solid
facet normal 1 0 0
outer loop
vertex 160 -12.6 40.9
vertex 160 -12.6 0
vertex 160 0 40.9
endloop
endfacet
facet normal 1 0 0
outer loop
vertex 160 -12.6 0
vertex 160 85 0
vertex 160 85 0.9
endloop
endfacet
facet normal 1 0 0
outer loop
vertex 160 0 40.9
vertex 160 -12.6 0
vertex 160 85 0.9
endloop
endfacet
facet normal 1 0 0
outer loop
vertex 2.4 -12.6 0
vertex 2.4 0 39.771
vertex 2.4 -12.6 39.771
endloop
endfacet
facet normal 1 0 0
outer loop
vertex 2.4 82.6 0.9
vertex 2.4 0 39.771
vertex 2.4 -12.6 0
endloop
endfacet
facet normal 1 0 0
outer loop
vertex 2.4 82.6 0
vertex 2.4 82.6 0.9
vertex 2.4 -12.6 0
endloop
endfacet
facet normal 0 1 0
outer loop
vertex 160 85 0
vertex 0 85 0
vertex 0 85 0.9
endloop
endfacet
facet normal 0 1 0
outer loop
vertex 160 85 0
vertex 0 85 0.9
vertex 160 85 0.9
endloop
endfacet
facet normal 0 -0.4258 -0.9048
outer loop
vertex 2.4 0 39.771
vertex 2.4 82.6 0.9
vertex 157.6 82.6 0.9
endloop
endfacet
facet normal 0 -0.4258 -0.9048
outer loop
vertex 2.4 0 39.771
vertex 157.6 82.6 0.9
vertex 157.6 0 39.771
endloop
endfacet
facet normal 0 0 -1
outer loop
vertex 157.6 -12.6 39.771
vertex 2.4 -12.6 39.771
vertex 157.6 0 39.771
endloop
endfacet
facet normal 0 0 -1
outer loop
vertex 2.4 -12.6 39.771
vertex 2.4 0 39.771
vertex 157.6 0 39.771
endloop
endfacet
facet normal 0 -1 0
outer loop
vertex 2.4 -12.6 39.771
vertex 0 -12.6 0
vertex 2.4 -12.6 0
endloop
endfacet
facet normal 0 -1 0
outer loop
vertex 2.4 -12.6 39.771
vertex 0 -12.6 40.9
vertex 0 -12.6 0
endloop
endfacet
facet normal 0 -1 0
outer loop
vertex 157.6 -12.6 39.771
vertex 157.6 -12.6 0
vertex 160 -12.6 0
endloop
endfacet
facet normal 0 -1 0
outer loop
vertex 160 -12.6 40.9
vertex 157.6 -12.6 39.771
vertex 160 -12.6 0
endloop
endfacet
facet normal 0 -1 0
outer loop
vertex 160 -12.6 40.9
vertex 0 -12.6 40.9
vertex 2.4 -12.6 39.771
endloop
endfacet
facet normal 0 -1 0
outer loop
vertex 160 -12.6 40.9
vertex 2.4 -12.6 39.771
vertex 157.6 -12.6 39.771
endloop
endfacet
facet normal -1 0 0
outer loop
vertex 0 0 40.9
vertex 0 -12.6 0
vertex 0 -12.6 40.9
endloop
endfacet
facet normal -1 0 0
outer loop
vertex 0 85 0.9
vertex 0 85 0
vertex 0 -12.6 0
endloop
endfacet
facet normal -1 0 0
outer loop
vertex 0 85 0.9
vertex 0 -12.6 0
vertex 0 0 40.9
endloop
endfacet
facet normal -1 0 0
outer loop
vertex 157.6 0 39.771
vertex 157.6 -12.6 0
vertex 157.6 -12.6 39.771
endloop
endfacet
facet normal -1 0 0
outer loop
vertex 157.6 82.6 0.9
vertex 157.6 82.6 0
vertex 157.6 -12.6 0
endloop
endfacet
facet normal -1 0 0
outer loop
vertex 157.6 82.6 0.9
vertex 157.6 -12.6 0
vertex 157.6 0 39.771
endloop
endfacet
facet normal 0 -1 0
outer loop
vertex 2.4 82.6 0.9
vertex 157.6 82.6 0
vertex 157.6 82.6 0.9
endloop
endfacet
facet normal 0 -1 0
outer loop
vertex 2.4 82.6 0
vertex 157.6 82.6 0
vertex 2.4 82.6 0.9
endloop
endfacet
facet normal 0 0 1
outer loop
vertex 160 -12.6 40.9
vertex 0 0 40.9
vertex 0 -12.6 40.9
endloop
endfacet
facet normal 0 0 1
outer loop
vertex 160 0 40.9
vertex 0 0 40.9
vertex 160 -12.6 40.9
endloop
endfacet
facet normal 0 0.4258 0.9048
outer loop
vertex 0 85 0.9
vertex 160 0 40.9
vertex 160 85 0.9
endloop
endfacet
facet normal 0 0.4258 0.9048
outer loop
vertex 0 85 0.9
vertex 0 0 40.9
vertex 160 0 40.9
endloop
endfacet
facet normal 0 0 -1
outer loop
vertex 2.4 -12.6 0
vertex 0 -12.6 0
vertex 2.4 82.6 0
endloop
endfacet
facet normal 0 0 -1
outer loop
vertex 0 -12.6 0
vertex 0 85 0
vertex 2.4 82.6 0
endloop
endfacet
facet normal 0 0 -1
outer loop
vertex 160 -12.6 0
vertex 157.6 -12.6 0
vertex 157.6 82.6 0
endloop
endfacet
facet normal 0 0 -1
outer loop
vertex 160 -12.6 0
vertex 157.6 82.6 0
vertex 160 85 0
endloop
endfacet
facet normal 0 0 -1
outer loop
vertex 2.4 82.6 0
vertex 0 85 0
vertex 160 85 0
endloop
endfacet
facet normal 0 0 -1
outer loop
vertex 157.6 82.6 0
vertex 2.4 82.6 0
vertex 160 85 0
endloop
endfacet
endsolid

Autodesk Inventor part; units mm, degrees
ref_plane "YZ Plane" through (0, 0, 0) normal (1, 0, 0) x (0, 1, 0)
ref_plane "XZ Plane" through (0, 0, 0) normal (0, 1, 0) x (-1, 0, 0)
ref_plane "XY Plane" through (0, 0, 0) normal (0, 0, 1) x (1, 0, 0)
sketch "Sketch1" plane through (0, 0, 0) normal (0, 0, 1) x (1, 0, 0)
  line L0 (0, 0) -> (0, 85)
  line L1 (0, 85) -> (160, 85)
  line L2 (160, 85) -> (160, 0)
  line L3 (160, 0) -> (157.6, 0)
  line L4 (157.6, 0) -> (157.6, 82.6)
  line L5 (157.6, 82.6) -> (2.4, 82.6)
  line L6 (2.4, 82.6) -> (2.4, 0)
  line L7 (2.4, 0) -> (0, 0)
  dimension "d0" = 85
  dimension "d1" = 160
  dimension "d2" = 2.4
  dimension "d3" = 82.6
  dimension "d4" = 155.2
extrude "Extrusion1" add sketch "Sketch1" along normal blind 0.9
sketch "Sketch2" plane through (0, 0, 0) normal (-1, 0, 0) x (0, 0, 1)
  line L0 (0, 0) -> (0.9, 0) projected
  line L1 (0.9, 0) -> (40.9, 0)
  line L2 (0.9, 0) -> (0.9, 85) projected
  line L3 (0.9, 85) -> (0.9, 0)
  line L4 (40.9, 0) -> (110.9, 0) construction
  line L5 (0.9, 85) -> (0.9, 0) projected
  line L6 (40.9, 0) -> (0.9, 85)
  dimension "d7" = 40
extrude "Extrusion2" add sketch "Sketch2" against normal blind 2.4
sketch "Sketch3" plane through (160, 0, 0) normal (1, 0, 0) x (0, 0, -1)
  line L0 (-0.9, 0) -> (-0.9, 85) projected
  line L1 (-0.9, 0) -> (-30.8653, 0)
  line L2 (0, 0) -> (-40.9, 0) projected
  line L3 (-0.9, 0) -> (-40.9, 0)
  line L4 (0, 85) -> (-0.9, 85) projected
  line L5 (-0.9, 85) -> (-0.9, 0)
  line L6 (0, 0) -> (-40.9, 0) projected
  line L7 (-0.9, 85) -> (-40.9, 0) projected
  line L8 (-0.9, 85) -> (-40.9, 0)
extrude "Extrusion3" add sketch "Sketch3" against normal blind 2.4
sketch "Sketch5" plane through (2.4, 0, 0) normal (1, 0, 0) x (0, 0, -1)
  line L0 (0, 0) -> (-40.9, 0) projected
  line L1 (-40.9, 0) -> (-0.9, 85)
  line L2 (-0.9, 85) -> (-0.9, 82.6) projected
  line L3 (-0.9, 85) -> (-0.9, 82.6)
  line L4 (-0.9, 82.6) -> (-39.7706, 0)
  line L5 (-39.7706, 0) -> (-40.9, 0)
extrude "Extrusion5" add sketch "Sketch5" along normal blind 156
sketch "Sketch6" plane through (0, 0, 40.9) normal (0, -1, 0) x (1, 0, 0)
  line L0 (0, -40.9) -> (160, -40.9) projected
  line L1 (0, 0) -> (0, -40) projected
  line L2 (0, -40.9) -> (0, 0)
  line L3 (0, 0) -> (160, 0) projected
  line L4 (0, 0) -> (160, 0)
  line L5 (160, -40.9) -> (160, 0) projected
  line L6 (160, 0) -> (160, -40.9)
  line L7 (157.6, -40.9) -> (157.6, -1.1294) projected
  line L8 (160, -40.9) -> (157.6, -40.9)
  line L9 (157.6, -40.9) -> (157.6, -1.1294)
  line L10 (2.4, -1.1294) -> (157.6, -1.1294) projected
  line L11 (157.6, -1.1294) -> (2.4, -1.1294)
  line L12 (2.4, -1.1294) -> (2.4, -40.9)
  line L13 (2.4, -40.9) -> (0, -40.9)
extrude "Extrusion6" add sketch "Sketch6" along normal blind 12.6 contours L2 L1 L3 L5 L0 L7 L10 L12
properties part number "Front_Chassi"
